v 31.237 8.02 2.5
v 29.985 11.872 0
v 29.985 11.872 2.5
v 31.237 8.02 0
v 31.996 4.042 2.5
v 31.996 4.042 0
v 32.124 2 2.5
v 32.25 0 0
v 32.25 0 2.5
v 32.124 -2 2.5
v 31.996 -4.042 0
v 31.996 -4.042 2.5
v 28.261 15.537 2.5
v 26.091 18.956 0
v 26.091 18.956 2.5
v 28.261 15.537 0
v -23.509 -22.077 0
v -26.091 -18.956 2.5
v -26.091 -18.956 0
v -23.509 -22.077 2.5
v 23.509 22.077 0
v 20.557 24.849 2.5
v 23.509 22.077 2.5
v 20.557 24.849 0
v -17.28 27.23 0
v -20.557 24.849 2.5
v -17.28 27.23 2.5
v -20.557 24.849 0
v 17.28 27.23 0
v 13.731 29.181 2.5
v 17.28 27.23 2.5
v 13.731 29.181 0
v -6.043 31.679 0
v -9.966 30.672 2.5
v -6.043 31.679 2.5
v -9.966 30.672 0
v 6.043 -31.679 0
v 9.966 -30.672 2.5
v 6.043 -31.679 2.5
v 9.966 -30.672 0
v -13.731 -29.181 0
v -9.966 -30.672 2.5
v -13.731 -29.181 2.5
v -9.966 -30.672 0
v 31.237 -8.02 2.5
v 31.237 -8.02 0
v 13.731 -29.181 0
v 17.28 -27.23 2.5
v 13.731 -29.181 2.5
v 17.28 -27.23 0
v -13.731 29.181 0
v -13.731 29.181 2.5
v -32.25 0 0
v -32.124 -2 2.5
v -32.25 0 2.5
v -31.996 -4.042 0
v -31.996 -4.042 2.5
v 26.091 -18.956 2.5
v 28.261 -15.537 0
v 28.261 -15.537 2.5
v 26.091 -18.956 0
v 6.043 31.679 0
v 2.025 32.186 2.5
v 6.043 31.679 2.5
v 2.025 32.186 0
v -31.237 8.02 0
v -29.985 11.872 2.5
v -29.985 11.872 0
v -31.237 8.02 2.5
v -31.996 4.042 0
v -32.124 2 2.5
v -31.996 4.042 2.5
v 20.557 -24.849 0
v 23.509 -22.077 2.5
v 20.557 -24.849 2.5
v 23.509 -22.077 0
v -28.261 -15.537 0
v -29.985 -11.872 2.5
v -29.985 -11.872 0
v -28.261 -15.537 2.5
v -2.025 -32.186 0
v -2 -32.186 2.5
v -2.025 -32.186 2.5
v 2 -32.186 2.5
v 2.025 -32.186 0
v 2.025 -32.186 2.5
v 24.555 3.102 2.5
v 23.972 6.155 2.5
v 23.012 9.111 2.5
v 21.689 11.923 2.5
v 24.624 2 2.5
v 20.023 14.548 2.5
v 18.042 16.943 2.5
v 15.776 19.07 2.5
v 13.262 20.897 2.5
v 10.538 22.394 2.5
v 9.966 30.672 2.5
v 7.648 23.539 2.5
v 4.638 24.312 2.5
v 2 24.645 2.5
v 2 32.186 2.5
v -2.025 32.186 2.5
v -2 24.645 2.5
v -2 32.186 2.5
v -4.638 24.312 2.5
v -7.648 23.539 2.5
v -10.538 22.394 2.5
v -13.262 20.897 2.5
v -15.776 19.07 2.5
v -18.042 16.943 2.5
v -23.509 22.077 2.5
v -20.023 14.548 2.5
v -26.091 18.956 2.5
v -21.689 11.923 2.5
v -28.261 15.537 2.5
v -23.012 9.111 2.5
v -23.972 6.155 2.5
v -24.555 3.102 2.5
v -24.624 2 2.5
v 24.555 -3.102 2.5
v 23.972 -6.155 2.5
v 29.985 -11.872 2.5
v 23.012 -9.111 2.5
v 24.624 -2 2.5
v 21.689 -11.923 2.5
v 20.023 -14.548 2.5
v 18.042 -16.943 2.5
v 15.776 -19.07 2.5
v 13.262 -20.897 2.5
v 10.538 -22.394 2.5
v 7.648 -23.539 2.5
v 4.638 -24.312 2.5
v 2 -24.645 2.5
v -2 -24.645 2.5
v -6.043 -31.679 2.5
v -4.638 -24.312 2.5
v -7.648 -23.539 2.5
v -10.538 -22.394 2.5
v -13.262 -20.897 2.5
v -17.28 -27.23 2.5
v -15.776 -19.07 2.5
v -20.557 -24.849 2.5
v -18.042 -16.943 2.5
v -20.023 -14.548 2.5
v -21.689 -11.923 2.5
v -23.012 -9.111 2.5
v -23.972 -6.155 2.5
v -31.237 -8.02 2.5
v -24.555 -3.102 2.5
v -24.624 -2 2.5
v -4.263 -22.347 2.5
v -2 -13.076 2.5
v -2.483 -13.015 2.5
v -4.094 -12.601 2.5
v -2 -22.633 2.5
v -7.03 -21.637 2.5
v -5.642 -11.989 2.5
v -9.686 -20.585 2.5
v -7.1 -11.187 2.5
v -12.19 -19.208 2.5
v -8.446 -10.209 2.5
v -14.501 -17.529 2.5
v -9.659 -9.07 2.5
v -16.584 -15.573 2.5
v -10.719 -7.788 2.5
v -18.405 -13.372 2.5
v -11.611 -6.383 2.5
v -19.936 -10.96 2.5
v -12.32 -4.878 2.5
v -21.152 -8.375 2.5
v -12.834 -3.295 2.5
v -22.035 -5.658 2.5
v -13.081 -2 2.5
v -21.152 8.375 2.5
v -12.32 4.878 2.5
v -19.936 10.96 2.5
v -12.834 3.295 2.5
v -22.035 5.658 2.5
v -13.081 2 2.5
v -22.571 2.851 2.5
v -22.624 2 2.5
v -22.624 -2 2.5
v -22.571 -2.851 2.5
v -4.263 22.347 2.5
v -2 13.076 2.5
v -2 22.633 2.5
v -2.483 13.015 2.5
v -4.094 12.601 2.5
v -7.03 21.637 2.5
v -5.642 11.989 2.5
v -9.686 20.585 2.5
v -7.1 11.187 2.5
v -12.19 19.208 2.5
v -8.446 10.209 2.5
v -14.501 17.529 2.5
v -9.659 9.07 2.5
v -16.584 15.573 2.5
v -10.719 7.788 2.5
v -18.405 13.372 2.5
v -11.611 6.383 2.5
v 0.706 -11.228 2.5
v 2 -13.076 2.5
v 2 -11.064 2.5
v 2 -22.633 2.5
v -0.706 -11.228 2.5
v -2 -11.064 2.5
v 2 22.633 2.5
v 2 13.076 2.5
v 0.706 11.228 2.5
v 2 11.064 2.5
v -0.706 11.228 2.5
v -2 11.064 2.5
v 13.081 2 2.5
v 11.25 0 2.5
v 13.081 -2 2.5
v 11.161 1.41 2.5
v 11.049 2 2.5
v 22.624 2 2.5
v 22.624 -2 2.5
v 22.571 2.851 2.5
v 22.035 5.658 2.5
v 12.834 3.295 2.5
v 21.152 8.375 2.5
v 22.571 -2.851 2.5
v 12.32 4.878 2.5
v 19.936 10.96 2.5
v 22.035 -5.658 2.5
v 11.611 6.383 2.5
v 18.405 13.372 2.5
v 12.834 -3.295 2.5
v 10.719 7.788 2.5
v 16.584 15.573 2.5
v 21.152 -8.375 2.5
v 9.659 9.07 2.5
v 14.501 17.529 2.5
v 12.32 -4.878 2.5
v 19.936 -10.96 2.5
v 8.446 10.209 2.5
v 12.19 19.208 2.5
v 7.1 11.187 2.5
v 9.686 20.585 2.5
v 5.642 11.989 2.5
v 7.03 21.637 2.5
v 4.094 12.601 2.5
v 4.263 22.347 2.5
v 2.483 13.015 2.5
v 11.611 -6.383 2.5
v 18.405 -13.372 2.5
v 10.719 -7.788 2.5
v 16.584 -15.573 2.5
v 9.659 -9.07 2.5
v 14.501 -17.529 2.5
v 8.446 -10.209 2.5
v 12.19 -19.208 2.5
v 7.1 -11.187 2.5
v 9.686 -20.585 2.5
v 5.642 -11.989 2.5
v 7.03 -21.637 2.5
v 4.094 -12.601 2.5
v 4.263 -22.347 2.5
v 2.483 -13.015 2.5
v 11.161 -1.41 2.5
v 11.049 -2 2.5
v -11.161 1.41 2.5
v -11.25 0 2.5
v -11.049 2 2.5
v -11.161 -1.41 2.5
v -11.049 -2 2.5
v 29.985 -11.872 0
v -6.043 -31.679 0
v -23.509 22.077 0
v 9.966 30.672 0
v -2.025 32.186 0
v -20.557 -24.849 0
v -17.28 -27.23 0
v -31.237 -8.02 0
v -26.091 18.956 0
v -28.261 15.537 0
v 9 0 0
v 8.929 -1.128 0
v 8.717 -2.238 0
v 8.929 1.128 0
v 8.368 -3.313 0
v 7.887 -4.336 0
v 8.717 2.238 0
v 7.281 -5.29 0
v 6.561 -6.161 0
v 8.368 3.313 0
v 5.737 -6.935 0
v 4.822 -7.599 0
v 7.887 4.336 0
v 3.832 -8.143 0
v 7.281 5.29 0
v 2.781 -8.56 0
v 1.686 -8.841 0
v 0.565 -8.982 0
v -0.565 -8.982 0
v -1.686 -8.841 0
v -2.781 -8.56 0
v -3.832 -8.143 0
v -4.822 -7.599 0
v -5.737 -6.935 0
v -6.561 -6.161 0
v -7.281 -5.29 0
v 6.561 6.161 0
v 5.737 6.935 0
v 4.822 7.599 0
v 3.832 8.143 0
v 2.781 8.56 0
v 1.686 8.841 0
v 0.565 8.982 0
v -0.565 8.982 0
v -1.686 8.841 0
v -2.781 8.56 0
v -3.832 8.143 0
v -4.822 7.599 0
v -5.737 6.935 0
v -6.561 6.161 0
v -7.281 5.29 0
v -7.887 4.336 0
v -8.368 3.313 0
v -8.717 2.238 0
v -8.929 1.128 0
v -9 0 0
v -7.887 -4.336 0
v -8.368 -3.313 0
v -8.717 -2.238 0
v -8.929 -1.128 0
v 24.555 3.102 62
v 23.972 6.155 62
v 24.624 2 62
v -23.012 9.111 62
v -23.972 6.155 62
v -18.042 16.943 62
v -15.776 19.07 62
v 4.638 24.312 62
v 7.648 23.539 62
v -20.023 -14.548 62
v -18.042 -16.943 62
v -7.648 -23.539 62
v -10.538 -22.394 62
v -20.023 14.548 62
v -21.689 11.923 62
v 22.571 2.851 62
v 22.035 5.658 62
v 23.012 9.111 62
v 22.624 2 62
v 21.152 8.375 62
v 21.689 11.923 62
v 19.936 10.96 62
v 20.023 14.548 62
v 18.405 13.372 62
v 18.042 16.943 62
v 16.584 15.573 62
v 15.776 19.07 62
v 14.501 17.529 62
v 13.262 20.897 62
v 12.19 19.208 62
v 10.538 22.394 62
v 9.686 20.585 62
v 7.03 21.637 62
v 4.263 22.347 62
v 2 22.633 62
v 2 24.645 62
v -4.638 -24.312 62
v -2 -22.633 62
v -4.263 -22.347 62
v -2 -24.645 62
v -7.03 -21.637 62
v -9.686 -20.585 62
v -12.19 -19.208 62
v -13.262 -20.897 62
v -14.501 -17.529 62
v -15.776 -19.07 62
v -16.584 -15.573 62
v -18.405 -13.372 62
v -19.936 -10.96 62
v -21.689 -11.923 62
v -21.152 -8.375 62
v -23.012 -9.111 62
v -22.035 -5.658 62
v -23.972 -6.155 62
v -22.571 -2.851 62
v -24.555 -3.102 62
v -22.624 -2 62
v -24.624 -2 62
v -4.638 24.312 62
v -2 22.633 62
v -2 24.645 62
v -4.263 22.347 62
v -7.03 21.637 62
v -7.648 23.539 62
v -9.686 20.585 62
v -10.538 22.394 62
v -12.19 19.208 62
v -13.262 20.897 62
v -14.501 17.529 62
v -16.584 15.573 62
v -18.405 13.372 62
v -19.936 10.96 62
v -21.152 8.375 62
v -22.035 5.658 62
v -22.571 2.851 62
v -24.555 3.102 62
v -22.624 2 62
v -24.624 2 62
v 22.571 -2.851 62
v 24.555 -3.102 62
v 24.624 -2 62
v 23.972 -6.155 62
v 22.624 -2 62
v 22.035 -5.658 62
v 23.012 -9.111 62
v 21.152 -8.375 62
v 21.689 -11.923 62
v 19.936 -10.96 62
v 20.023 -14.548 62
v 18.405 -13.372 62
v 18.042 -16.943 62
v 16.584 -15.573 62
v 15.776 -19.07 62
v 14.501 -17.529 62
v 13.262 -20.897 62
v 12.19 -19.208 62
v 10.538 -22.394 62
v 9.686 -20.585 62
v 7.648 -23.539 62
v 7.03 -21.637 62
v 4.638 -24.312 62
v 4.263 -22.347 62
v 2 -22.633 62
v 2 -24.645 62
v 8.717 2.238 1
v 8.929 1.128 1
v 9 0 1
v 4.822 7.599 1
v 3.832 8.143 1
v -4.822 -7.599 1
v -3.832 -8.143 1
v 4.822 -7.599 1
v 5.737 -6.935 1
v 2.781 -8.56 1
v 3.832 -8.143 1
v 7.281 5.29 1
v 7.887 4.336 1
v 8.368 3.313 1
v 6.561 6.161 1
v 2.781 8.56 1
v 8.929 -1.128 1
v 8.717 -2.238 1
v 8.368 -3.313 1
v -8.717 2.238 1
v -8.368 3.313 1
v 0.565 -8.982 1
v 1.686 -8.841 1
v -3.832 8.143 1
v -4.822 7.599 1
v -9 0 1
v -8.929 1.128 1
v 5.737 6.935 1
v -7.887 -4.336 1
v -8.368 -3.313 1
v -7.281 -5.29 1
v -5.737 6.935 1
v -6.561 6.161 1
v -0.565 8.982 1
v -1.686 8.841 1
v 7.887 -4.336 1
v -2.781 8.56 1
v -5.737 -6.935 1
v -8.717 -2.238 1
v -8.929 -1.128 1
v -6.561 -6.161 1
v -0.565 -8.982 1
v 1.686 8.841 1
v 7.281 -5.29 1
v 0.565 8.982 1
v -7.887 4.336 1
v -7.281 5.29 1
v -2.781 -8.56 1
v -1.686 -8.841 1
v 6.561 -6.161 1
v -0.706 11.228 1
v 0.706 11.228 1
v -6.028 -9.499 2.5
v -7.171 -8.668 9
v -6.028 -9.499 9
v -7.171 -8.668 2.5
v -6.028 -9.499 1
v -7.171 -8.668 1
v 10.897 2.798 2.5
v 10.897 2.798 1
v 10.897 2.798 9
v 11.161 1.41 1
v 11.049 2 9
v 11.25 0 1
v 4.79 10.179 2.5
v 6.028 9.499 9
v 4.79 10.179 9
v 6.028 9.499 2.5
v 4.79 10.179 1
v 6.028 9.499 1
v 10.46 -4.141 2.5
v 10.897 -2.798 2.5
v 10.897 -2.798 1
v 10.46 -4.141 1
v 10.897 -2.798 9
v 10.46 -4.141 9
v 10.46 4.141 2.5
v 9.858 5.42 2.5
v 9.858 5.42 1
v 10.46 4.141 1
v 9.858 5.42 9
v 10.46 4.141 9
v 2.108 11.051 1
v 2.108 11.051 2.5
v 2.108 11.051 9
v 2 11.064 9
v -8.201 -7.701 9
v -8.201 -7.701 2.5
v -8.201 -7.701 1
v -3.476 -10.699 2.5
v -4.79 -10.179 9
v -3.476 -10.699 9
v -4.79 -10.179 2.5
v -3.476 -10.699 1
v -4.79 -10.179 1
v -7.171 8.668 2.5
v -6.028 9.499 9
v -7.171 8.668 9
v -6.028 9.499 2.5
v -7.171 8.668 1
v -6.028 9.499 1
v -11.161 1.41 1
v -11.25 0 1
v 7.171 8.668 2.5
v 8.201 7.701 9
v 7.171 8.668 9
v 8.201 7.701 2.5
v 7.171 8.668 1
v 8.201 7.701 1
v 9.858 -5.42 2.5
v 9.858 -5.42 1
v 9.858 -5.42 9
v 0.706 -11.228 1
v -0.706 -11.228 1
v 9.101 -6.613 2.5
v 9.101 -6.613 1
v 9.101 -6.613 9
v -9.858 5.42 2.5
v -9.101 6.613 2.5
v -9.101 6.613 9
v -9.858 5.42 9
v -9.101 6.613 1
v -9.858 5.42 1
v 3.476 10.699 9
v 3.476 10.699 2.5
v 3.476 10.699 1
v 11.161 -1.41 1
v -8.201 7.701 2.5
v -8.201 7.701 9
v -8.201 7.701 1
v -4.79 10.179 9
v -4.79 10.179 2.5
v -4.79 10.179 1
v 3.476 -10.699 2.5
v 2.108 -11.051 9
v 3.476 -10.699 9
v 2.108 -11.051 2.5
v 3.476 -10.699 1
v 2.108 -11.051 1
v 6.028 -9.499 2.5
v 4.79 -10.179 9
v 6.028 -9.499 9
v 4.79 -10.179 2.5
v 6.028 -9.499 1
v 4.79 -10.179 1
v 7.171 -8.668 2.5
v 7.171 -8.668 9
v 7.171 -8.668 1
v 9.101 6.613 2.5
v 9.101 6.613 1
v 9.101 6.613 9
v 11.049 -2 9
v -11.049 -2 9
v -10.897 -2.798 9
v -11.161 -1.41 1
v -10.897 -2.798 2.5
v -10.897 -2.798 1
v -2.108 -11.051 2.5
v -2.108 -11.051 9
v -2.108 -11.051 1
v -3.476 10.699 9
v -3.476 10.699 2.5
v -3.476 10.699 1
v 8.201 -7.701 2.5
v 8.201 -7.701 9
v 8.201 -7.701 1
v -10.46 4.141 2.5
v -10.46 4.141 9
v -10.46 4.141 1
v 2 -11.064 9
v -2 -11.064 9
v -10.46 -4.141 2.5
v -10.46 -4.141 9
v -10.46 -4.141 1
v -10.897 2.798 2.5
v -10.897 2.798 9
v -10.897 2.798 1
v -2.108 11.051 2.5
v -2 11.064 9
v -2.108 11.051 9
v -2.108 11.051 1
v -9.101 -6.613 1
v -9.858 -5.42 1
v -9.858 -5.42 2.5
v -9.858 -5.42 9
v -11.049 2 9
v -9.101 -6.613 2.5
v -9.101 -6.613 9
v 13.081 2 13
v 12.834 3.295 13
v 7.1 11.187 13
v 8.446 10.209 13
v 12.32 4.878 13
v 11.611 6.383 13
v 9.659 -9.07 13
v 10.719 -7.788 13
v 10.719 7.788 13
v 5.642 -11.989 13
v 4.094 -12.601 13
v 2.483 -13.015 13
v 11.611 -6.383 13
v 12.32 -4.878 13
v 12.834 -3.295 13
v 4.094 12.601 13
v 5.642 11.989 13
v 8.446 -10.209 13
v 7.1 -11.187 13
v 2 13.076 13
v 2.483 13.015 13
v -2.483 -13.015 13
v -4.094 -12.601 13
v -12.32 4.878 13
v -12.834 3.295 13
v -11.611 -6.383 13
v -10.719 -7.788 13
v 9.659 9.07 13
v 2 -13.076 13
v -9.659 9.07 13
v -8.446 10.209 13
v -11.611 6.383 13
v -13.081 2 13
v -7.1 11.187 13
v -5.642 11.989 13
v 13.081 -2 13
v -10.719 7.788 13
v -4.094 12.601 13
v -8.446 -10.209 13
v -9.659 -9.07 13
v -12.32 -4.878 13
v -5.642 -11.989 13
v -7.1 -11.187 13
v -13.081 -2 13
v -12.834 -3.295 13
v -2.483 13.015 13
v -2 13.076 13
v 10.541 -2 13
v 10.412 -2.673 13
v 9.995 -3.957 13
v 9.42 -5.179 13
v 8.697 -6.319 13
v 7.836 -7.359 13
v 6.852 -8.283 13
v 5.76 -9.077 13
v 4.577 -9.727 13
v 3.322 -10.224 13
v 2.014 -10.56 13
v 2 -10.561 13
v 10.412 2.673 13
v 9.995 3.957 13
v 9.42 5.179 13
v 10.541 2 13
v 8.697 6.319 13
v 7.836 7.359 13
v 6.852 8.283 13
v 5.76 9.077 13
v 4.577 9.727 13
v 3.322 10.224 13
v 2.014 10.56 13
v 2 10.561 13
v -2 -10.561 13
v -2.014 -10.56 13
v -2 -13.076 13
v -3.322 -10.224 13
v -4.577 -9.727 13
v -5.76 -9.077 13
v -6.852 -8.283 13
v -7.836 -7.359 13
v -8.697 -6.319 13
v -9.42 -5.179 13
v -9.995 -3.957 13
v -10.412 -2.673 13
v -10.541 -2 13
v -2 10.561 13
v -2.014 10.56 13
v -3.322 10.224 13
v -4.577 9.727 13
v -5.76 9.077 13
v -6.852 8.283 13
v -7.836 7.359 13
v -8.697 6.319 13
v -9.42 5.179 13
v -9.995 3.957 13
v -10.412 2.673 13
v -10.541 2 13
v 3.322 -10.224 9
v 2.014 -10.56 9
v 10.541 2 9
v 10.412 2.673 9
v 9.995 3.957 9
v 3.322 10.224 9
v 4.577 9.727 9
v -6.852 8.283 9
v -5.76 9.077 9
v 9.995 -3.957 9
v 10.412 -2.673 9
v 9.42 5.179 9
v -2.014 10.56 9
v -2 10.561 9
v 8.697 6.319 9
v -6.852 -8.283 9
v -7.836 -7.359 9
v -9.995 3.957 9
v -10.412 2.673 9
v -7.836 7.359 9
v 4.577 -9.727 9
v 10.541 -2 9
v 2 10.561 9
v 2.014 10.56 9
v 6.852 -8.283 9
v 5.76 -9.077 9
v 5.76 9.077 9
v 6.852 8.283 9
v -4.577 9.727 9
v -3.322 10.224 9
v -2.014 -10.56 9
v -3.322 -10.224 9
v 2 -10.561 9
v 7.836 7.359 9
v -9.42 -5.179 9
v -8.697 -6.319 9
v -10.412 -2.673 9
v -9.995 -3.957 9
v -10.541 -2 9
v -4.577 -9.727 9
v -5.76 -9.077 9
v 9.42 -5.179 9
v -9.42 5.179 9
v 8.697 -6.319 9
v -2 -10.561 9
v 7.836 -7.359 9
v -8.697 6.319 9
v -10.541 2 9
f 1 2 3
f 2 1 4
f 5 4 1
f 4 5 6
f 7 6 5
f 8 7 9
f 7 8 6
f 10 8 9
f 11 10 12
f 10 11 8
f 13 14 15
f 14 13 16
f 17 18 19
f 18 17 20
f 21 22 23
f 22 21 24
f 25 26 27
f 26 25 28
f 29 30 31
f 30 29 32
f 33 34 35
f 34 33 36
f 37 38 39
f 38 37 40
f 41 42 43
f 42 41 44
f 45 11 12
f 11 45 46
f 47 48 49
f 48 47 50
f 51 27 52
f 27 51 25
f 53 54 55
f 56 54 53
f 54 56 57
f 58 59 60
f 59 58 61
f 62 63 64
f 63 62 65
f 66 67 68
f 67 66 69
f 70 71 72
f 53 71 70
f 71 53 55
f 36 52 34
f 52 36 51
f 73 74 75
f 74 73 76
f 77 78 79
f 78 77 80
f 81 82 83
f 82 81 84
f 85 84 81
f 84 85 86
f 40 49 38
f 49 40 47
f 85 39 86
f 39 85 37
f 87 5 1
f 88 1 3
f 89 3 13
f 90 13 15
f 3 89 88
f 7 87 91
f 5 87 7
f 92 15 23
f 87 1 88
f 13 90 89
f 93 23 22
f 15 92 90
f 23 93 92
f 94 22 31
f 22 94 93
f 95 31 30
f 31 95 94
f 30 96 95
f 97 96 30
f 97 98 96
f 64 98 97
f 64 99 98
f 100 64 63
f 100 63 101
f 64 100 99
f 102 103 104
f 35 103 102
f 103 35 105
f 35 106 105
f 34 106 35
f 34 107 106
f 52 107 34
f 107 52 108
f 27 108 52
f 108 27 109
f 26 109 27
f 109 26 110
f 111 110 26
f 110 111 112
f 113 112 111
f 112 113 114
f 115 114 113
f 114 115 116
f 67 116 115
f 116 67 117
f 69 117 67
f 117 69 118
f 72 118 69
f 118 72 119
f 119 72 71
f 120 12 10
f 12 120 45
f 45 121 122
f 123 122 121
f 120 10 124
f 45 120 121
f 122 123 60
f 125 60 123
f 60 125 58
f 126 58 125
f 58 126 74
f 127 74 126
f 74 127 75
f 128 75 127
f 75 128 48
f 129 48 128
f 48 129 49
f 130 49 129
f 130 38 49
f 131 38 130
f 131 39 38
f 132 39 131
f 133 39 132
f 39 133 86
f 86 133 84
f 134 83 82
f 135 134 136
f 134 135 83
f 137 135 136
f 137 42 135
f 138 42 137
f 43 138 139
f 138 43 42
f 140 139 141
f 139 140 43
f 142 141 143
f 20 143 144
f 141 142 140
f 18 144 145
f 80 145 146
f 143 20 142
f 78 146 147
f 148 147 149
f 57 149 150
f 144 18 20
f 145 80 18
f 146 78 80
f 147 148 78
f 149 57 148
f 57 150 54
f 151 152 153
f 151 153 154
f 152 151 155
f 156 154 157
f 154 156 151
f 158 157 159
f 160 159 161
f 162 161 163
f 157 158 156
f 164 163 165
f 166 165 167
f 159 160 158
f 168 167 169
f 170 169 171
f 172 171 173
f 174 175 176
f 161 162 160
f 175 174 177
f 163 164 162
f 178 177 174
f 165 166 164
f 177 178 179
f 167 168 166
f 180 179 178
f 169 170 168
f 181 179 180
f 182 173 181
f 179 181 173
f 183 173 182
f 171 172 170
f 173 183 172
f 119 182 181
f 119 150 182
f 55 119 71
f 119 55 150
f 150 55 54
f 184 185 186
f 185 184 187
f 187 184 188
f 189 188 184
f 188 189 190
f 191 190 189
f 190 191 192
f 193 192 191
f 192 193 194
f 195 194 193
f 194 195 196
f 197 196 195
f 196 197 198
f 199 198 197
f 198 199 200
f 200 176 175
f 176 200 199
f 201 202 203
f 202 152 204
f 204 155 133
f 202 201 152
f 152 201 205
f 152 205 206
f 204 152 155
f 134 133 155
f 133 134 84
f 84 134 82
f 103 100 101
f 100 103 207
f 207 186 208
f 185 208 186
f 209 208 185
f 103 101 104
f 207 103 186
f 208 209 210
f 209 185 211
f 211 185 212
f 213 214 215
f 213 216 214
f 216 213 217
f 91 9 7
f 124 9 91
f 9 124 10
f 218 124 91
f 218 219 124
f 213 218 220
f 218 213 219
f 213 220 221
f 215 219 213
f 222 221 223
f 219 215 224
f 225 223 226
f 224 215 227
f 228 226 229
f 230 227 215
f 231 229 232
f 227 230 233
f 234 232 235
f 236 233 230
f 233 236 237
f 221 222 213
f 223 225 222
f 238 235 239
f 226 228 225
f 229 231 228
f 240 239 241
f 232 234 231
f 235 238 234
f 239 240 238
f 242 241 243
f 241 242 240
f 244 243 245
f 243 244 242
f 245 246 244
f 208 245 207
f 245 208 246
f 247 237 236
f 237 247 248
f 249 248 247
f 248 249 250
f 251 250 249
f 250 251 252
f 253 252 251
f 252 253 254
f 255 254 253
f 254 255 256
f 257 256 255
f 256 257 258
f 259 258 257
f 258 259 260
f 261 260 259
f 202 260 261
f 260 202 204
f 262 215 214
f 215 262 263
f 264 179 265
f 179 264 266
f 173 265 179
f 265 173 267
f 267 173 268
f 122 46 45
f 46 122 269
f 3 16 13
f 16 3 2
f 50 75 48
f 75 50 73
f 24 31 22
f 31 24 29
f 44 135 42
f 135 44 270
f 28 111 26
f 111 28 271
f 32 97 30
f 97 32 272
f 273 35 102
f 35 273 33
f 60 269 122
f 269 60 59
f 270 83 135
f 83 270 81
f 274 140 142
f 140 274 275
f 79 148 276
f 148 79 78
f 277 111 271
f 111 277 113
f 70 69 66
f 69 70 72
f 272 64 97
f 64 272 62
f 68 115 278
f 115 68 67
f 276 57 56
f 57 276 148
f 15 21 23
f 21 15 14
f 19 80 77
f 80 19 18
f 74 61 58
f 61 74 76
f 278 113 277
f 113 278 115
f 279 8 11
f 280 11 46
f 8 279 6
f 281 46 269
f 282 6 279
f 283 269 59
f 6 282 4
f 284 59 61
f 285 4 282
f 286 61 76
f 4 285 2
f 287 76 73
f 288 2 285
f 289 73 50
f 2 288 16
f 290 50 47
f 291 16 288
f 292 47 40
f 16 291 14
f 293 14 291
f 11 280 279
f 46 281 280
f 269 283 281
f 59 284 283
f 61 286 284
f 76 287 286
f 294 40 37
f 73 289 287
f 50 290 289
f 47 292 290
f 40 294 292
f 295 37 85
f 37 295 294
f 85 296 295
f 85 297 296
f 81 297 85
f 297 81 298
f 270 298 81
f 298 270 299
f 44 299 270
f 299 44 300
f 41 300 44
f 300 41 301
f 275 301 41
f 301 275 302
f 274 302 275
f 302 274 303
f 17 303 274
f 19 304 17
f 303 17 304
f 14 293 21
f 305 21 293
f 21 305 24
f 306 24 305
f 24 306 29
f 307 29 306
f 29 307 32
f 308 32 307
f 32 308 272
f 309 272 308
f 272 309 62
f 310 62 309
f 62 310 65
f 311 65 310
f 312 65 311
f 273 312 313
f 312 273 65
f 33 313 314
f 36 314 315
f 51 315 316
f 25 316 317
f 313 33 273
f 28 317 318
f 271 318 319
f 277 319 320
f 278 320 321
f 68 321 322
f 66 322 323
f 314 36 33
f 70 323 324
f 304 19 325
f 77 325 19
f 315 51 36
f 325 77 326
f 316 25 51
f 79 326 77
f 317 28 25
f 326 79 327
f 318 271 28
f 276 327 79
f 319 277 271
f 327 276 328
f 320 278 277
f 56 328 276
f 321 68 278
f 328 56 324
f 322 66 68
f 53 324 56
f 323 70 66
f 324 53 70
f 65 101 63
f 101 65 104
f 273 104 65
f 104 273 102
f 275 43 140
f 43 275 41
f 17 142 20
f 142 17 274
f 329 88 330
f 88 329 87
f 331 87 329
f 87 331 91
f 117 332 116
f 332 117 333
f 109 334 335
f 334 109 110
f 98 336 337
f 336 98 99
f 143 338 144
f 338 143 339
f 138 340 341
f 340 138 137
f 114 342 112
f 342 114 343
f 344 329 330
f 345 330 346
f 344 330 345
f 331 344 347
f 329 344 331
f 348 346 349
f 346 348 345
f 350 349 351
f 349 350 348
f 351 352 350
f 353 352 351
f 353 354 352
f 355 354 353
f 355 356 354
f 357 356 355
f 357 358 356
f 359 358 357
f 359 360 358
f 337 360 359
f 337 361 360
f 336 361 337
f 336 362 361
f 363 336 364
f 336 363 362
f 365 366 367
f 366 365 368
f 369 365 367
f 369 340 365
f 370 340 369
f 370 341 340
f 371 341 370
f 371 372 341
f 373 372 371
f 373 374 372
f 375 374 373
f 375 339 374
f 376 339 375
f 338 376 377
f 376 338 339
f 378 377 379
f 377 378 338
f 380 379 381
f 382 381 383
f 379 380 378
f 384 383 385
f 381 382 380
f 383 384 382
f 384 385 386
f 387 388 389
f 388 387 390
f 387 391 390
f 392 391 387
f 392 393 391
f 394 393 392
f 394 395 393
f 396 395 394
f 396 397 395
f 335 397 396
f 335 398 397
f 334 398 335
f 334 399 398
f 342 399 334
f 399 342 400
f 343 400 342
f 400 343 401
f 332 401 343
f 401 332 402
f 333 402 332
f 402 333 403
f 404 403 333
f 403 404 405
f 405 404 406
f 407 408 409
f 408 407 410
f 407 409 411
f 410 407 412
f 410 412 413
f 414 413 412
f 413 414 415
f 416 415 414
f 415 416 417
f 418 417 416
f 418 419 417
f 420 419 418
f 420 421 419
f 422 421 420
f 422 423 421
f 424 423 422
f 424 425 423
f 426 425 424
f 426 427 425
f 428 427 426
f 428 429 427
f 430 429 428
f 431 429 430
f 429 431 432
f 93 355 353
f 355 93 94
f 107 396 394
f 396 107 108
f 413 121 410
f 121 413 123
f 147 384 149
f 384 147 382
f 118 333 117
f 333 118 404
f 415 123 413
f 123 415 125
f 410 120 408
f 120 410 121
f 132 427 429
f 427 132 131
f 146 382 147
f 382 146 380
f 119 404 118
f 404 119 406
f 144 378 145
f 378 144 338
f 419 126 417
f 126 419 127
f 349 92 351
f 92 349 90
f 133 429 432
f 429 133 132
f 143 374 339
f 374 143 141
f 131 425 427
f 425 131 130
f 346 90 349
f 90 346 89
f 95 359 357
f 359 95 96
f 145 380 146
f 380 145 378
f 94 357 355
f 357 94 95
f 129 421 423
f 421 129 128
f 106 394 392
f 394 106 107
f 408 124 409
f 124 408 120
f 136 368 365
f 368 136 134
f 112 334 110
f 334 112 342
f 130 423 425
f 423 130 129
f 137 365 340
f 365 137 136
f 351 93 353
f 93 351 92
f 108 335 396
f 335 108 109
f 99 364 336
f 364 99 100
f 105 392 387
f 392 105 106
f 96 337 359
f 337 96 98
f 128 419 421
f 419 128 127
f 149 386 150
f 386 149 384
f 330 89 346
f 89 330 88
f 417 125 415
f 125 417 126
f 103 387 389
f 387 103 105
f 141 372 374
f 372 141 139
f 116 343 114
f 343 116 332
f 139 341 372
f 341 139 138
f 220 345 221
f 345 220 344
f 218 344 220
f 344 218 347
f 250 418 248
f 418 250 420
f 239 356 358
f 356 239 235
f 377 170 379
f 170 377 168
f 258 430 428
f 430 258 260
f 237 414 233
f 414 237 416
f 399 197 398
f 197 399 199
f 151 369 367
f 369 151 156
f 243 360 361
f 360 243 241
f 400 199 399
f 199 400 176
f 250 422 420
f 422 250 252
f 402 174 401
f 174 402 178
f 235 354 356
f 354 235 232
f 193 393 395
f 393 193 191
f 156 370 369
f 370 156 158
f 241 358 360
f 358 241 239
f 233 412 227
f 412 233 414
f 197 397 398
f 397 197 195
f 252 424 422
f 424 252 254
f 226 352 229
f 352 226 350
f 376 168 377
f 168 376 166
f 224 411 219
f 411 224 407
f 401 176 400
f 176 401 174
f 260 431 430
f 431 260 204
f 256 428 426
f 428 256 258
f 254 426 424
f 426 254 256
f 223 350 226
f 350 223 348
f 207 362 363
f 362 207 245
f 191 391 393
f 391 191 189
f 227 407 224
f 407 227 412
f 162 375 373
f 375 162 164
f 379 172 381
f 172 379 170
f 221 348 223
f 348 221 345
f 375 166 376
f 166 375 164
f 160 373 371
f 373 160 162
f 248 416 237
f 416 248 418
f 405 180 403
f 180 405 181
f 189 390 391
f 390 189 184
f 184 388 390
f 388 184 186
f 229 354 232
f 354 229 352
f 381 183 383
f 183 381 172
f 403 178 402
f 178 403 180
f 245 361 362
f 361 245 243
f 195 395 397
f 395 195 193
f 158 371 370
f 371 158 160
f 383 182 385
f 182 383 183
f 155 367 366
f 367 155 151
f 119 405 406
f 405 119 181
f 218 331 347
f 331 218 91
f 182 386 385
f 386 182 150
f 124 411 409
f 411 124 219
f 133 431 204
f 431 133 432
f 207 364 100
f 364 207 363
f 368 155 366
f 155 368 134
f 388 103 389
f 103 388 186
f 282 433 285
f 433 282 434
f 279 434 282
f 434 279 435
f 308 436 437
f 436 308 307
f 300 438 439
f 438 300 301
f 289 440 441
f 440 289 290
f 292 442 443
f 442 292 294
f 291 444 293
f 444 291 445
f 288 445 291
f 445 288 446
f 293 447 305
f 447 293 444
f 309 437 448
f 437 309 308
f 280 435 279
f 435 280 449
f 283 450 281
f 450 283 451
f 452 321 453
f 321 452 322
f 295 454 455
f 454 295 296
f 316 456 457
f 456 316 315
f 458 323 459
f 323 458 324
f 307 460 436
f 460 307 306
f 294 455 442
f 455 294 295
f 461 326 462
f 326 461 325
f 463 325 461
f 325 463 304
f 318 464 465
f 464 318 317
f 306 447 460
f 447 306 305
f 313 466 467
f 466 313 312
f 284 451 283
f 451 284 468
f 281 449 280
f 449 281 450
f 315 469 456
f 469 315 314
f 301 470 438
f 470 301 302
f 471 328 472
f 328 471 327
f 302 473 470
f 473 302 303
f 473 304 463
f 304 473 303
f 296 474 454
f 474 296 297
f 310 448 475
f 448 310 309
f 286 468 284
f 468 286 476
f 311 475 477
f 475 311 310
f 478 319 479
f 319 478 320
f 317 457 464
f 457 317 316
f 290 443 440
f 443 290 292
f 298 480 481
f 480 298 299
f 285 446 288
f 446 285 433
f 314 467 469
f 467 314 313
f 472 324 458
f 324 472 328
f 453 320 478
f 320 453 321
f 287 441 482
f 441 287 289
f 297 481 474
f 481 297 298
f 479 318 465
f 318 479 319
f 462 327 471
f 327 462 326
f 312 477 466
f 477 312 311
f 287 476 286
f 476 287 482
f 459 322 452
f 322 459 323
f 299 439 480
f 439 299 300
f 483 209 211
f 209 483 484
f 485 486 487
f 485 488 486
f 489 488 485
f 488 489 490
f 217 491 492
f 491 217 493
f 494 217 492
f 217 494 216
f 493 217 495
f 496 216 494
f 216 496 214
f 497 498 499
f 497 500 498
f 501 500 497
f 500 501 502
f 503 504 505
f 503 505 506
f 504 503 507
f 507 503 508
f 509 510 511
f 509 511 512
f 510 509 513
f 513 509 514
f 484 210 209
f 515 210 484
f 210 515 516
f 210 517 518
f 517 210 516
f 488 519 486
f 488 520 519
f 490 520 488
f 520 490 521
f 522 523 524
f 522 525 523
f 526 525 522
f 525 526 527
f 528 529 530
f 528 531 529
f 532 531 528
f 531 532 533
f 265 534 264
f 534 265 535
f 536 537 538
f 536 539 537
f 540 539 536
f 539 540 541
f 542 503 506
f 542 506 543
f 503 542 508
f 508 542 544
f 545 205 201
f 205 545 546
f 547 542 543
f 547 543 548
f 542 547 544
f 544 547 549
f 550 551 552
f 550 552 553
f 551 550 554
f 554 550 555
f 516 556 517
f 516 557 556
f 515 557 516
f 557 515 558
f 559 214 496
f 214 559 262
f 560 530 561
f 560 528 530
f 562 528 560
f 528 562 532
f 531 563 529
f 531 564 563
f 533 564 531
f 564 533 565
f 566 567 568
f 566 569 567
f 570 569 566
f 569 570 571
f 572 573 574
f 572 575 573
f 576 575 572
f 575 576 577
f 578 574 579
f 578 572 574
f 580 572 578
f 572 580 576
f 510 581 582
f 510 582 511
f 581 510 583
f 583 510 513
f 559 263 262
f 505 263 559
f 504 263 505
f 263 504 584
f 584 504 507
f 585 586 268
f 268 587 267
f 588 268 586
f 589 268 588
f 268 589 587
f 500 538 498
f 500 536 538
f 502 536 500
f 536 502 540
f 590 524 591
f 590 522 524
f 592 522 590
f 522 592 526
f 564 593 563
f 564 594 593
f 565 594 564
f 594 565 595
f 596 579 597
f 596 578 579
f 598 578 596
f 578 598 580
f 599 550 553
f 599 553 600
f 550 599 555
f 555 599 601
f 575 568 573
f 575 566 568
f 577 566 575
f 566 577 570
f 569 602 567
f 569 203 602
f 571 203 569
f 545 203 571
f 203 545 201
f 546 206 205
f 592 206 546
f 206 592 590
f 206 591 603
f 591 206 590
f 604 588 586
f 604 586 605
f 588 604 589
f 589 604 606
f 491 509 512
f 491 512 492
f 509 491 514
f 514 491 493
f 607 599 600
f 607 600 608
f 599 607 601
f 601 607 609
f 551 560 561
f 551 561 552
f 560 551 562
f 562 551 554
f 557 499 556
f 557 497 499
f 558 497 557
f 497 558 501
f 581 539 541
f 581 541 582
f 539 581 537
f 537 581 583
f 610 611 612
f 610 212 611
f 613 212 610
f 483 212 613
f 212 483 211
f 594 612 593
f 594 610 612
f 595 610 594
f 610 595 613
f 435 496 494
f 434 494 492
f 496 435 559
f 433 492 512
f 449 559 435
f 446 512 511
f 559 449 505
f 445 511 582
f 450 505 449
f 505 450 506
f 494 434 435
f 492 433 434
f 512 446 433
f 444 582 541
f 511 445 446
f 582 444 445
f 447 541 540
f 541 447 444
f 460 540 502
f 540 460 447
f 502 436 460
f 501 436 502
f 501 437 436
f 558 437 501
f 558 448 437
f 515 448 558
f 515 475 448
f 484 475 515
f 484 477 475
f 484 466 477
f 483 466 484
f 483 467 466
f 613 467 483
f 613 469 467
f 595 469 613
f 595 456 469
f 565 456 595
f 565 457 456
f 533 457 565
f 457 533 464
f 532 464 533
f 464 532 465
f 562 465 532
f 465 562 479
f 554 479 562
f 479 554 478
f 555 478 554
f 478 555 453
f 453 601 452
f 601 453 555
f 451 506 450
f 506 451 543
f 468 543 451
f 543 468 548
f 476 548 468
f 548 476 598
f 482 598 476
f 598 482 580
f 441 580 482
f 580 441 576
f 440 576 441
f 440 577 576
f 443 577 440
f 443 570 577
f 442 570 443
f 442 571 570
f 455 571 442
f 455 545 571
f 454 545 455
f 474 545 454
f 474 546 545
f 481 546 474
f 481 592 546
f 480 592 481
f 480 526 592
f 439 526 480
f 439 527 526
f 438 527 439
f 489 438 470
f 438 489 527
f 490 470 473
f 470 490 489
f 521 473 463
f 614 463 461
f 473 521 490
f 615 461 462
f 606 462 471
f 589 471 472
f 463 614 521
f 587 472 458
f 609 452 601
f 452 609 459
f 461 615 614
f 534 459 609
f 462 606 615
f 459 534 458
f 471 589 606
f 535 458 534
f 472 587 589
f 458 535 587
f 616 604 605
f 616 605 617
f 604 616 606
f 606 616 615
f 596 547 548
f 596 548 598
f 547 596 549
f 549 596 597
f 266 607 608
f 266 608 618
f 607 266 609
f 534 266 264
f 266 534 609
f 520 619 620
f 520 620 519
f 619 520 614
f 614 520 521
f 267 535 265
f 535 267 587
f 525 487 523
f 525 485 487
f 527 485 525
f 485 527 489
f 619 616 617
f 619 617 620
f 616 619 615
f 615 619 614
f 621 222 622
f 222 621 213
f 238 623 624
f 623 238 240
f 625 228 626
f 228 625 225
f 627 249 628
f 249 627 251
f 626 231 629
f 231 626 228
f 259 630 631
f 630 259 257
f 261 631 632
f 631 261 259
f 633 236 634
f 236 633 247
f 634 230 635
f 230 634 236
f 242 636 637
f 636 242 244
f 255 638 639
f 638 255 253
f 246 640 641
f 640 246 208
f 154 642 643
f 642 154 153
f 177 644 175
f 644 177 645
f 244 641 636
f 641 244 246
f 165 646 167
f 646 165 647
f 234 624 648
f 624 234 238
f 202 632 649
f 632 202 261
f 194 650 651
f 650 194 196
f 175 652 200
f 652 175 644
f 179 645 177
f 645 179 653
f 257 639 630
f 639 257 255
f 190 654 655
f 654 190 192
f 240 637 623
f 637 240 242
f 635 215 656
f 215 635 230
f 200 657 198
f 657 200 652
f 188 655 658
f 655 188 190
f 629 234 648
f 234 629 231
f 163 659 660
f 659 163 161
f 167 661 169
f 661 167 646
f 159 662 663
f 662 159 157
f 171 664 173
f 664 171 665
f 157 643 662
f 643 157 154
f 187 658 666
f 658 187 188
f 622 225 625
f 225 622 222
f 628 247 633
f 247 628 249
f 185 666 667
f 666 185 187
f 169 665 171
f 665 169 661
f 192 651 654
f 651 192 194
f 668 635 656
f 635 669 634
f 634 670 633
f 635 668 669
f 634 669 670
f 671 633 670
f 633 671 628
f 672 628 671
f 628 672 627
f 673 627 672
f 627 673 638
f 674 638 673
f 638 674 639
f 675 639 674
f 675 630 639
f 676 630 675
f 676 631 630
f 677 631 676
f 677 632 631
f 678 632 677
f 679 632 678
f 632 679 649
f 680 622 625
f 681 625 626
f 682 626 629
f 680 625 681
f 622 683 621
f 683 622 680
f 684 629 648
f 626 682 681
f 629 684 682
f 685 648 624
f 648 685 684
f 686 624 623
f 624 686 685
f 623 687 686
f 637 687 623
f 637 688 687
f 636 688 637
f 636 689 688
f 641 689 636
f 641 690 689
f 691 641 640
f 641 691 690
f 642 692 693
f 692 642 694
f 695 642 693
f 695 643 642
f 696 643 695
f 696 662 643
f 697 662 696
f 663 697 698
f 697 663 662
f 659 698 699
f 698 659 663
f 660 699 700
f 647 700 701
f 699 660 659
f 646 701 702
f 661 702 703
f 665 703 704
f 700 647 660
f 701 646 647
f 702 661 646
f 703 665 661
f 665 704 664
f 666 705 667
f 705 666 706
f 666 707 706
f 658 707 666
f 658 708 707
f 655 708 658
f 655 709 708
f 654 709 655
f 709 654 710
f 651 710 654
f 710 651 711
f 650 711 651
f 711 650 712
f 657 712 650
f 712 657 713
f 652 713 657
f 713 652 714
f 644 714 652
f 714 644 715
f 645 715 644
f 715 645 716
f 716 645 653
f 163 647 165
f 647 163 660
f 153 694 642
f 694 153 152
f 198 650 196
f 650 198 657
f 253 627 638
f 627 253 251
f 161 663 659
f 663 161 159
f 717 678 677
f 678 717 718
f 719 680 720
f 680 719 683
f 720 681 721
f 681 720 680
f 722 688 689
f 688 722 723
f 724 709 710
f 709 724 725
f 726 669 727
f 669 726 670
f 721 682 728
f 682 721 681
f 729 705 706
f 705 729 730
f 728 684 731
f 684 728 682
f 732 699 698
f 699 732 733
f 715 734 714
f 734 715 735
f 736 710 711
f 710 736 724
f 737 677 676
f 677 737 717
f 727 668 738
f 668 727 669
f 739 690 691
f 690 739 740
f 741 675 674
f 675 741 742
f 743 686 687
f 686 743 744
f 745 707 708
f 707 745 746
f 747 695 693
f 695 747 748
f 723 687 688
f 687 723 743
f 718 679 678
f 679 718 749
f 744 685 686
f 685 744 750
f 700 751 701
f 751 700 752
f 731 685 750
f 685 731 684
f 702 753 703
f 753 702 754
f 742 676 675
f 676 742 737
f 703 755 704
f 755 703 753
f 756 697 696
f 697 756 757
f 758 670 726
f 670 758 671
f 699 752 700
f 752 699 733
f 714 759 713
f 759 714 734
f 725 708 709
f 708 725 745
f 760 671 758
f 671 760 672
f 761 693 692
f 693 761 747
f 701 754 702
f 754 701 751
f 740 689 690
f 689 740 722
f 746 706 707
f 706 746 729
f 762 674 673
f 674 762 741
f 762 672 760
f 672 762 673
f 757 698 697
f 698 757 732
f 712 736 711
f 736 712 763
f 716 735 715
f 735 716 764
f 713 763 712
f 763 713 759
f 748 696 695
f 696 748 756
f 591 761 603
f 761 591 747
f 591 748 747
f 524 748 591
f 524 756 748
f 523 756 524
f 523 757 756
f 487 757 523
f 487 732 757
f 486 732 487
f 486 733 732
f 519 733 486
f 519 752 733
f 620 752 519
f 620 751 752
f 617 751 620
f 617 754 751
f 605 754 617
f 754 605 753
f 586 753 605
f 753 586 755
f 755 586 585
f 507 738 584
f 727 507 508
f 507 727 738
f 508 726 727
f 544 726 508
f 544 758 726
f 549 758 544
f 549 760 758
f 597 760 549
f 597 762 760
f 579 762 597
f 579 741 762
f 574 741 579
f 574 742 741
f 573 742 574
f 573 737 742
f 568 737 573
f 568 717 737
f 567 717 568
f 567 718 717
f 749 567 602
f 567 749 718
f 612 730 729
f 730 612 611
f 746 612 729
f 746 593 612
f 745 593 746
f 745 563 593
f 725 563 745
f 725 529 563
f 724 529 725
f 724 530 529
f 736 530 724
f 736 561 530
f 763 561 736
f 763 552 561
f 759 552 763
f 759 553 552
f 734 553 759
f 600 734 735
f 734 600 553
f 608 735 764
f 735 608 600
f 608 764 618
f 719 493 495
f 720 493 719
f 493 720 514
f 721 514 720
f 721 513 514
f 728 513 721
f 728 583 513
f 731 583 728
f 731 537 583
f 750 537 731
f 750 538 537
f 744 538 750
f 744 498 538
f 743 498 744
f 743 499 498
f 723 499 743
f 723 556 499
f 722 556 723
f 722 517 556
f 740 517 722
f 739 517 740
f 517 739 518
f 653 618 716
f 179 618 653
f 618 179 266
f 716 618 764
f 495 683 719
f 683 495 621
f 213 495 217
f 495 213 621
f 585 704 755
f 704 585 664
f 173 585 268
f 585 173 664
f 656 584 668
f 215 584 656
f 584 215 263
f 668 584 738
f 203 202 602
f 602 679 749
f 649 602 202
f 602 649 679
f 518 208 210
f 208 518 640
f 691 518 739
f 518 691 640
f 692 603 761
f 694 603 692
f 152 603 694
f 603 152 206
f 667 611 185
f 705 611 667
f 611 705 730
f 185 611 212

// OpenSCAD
$fn=50;
spindleInnerDia = 49.5;
bearingOuterDia = 22.5;
bearingInnerDia = 18;

maxDia = spindleInnerDia + 15;

totalWidth = 62;
bearingWidth = 8;
ringWidth = 2.5;
thickness = 2;
bearingStopThickness = 1;

module spindleBearingAdapter()
{
    // Spindle:
	difference() {
		union() {
			cylinder(d = maxDia, h = ringWidth);
	      	cylinder(d = spindleInnerDia, h = totalWidth);
		}
        //Empty out external cylinder
        translate([0,0,ringWidth]) cylinder(d = spindleInnerDia-2*thickness, h = totalWidth);
        //BEGIN Break cilynders 
        translate([-maxDia/2,-thickness,ringWidth]) cube([maxDia, 2*thickness, totalWidth]);
        translate([-thickness,-maxDia/2,ringWidth]) cube([2*thickness, maxDia, totalWidth]);
        //END Break cilynders 
      	cylinder(d = bearingInnerDia, h = totalWidth+2);
        translate([0,0,bearingStopThickness])
      	cylinder(d = bearingOuterDia, h = totalWidth+2);
	}
    // Bearing:
	difference() {
        totalBearingWidth = bearingWidth + 5;
		cylinder(d = bearingOuterDia+2*thickness, h = totalBearingWidth);
		cylinder(d = bearingOuterDia-1, h = totalBearingWidth);
		cylinder(d = bearingOuterDia, h = bearingWidth+1);
        //BEGIN Break cilynders 
        translate([-maxDia/2,-thickness,ringWidth]) cube([maxDia, 2*thickness, totalWidth]);
        translate([-thickness,-maxDia/2,ringWidth]) cube([2*thickness, maxDia, totalWidth]);
        //END Break cilynders 
    }
    
}

spindleBearingAdapter();
